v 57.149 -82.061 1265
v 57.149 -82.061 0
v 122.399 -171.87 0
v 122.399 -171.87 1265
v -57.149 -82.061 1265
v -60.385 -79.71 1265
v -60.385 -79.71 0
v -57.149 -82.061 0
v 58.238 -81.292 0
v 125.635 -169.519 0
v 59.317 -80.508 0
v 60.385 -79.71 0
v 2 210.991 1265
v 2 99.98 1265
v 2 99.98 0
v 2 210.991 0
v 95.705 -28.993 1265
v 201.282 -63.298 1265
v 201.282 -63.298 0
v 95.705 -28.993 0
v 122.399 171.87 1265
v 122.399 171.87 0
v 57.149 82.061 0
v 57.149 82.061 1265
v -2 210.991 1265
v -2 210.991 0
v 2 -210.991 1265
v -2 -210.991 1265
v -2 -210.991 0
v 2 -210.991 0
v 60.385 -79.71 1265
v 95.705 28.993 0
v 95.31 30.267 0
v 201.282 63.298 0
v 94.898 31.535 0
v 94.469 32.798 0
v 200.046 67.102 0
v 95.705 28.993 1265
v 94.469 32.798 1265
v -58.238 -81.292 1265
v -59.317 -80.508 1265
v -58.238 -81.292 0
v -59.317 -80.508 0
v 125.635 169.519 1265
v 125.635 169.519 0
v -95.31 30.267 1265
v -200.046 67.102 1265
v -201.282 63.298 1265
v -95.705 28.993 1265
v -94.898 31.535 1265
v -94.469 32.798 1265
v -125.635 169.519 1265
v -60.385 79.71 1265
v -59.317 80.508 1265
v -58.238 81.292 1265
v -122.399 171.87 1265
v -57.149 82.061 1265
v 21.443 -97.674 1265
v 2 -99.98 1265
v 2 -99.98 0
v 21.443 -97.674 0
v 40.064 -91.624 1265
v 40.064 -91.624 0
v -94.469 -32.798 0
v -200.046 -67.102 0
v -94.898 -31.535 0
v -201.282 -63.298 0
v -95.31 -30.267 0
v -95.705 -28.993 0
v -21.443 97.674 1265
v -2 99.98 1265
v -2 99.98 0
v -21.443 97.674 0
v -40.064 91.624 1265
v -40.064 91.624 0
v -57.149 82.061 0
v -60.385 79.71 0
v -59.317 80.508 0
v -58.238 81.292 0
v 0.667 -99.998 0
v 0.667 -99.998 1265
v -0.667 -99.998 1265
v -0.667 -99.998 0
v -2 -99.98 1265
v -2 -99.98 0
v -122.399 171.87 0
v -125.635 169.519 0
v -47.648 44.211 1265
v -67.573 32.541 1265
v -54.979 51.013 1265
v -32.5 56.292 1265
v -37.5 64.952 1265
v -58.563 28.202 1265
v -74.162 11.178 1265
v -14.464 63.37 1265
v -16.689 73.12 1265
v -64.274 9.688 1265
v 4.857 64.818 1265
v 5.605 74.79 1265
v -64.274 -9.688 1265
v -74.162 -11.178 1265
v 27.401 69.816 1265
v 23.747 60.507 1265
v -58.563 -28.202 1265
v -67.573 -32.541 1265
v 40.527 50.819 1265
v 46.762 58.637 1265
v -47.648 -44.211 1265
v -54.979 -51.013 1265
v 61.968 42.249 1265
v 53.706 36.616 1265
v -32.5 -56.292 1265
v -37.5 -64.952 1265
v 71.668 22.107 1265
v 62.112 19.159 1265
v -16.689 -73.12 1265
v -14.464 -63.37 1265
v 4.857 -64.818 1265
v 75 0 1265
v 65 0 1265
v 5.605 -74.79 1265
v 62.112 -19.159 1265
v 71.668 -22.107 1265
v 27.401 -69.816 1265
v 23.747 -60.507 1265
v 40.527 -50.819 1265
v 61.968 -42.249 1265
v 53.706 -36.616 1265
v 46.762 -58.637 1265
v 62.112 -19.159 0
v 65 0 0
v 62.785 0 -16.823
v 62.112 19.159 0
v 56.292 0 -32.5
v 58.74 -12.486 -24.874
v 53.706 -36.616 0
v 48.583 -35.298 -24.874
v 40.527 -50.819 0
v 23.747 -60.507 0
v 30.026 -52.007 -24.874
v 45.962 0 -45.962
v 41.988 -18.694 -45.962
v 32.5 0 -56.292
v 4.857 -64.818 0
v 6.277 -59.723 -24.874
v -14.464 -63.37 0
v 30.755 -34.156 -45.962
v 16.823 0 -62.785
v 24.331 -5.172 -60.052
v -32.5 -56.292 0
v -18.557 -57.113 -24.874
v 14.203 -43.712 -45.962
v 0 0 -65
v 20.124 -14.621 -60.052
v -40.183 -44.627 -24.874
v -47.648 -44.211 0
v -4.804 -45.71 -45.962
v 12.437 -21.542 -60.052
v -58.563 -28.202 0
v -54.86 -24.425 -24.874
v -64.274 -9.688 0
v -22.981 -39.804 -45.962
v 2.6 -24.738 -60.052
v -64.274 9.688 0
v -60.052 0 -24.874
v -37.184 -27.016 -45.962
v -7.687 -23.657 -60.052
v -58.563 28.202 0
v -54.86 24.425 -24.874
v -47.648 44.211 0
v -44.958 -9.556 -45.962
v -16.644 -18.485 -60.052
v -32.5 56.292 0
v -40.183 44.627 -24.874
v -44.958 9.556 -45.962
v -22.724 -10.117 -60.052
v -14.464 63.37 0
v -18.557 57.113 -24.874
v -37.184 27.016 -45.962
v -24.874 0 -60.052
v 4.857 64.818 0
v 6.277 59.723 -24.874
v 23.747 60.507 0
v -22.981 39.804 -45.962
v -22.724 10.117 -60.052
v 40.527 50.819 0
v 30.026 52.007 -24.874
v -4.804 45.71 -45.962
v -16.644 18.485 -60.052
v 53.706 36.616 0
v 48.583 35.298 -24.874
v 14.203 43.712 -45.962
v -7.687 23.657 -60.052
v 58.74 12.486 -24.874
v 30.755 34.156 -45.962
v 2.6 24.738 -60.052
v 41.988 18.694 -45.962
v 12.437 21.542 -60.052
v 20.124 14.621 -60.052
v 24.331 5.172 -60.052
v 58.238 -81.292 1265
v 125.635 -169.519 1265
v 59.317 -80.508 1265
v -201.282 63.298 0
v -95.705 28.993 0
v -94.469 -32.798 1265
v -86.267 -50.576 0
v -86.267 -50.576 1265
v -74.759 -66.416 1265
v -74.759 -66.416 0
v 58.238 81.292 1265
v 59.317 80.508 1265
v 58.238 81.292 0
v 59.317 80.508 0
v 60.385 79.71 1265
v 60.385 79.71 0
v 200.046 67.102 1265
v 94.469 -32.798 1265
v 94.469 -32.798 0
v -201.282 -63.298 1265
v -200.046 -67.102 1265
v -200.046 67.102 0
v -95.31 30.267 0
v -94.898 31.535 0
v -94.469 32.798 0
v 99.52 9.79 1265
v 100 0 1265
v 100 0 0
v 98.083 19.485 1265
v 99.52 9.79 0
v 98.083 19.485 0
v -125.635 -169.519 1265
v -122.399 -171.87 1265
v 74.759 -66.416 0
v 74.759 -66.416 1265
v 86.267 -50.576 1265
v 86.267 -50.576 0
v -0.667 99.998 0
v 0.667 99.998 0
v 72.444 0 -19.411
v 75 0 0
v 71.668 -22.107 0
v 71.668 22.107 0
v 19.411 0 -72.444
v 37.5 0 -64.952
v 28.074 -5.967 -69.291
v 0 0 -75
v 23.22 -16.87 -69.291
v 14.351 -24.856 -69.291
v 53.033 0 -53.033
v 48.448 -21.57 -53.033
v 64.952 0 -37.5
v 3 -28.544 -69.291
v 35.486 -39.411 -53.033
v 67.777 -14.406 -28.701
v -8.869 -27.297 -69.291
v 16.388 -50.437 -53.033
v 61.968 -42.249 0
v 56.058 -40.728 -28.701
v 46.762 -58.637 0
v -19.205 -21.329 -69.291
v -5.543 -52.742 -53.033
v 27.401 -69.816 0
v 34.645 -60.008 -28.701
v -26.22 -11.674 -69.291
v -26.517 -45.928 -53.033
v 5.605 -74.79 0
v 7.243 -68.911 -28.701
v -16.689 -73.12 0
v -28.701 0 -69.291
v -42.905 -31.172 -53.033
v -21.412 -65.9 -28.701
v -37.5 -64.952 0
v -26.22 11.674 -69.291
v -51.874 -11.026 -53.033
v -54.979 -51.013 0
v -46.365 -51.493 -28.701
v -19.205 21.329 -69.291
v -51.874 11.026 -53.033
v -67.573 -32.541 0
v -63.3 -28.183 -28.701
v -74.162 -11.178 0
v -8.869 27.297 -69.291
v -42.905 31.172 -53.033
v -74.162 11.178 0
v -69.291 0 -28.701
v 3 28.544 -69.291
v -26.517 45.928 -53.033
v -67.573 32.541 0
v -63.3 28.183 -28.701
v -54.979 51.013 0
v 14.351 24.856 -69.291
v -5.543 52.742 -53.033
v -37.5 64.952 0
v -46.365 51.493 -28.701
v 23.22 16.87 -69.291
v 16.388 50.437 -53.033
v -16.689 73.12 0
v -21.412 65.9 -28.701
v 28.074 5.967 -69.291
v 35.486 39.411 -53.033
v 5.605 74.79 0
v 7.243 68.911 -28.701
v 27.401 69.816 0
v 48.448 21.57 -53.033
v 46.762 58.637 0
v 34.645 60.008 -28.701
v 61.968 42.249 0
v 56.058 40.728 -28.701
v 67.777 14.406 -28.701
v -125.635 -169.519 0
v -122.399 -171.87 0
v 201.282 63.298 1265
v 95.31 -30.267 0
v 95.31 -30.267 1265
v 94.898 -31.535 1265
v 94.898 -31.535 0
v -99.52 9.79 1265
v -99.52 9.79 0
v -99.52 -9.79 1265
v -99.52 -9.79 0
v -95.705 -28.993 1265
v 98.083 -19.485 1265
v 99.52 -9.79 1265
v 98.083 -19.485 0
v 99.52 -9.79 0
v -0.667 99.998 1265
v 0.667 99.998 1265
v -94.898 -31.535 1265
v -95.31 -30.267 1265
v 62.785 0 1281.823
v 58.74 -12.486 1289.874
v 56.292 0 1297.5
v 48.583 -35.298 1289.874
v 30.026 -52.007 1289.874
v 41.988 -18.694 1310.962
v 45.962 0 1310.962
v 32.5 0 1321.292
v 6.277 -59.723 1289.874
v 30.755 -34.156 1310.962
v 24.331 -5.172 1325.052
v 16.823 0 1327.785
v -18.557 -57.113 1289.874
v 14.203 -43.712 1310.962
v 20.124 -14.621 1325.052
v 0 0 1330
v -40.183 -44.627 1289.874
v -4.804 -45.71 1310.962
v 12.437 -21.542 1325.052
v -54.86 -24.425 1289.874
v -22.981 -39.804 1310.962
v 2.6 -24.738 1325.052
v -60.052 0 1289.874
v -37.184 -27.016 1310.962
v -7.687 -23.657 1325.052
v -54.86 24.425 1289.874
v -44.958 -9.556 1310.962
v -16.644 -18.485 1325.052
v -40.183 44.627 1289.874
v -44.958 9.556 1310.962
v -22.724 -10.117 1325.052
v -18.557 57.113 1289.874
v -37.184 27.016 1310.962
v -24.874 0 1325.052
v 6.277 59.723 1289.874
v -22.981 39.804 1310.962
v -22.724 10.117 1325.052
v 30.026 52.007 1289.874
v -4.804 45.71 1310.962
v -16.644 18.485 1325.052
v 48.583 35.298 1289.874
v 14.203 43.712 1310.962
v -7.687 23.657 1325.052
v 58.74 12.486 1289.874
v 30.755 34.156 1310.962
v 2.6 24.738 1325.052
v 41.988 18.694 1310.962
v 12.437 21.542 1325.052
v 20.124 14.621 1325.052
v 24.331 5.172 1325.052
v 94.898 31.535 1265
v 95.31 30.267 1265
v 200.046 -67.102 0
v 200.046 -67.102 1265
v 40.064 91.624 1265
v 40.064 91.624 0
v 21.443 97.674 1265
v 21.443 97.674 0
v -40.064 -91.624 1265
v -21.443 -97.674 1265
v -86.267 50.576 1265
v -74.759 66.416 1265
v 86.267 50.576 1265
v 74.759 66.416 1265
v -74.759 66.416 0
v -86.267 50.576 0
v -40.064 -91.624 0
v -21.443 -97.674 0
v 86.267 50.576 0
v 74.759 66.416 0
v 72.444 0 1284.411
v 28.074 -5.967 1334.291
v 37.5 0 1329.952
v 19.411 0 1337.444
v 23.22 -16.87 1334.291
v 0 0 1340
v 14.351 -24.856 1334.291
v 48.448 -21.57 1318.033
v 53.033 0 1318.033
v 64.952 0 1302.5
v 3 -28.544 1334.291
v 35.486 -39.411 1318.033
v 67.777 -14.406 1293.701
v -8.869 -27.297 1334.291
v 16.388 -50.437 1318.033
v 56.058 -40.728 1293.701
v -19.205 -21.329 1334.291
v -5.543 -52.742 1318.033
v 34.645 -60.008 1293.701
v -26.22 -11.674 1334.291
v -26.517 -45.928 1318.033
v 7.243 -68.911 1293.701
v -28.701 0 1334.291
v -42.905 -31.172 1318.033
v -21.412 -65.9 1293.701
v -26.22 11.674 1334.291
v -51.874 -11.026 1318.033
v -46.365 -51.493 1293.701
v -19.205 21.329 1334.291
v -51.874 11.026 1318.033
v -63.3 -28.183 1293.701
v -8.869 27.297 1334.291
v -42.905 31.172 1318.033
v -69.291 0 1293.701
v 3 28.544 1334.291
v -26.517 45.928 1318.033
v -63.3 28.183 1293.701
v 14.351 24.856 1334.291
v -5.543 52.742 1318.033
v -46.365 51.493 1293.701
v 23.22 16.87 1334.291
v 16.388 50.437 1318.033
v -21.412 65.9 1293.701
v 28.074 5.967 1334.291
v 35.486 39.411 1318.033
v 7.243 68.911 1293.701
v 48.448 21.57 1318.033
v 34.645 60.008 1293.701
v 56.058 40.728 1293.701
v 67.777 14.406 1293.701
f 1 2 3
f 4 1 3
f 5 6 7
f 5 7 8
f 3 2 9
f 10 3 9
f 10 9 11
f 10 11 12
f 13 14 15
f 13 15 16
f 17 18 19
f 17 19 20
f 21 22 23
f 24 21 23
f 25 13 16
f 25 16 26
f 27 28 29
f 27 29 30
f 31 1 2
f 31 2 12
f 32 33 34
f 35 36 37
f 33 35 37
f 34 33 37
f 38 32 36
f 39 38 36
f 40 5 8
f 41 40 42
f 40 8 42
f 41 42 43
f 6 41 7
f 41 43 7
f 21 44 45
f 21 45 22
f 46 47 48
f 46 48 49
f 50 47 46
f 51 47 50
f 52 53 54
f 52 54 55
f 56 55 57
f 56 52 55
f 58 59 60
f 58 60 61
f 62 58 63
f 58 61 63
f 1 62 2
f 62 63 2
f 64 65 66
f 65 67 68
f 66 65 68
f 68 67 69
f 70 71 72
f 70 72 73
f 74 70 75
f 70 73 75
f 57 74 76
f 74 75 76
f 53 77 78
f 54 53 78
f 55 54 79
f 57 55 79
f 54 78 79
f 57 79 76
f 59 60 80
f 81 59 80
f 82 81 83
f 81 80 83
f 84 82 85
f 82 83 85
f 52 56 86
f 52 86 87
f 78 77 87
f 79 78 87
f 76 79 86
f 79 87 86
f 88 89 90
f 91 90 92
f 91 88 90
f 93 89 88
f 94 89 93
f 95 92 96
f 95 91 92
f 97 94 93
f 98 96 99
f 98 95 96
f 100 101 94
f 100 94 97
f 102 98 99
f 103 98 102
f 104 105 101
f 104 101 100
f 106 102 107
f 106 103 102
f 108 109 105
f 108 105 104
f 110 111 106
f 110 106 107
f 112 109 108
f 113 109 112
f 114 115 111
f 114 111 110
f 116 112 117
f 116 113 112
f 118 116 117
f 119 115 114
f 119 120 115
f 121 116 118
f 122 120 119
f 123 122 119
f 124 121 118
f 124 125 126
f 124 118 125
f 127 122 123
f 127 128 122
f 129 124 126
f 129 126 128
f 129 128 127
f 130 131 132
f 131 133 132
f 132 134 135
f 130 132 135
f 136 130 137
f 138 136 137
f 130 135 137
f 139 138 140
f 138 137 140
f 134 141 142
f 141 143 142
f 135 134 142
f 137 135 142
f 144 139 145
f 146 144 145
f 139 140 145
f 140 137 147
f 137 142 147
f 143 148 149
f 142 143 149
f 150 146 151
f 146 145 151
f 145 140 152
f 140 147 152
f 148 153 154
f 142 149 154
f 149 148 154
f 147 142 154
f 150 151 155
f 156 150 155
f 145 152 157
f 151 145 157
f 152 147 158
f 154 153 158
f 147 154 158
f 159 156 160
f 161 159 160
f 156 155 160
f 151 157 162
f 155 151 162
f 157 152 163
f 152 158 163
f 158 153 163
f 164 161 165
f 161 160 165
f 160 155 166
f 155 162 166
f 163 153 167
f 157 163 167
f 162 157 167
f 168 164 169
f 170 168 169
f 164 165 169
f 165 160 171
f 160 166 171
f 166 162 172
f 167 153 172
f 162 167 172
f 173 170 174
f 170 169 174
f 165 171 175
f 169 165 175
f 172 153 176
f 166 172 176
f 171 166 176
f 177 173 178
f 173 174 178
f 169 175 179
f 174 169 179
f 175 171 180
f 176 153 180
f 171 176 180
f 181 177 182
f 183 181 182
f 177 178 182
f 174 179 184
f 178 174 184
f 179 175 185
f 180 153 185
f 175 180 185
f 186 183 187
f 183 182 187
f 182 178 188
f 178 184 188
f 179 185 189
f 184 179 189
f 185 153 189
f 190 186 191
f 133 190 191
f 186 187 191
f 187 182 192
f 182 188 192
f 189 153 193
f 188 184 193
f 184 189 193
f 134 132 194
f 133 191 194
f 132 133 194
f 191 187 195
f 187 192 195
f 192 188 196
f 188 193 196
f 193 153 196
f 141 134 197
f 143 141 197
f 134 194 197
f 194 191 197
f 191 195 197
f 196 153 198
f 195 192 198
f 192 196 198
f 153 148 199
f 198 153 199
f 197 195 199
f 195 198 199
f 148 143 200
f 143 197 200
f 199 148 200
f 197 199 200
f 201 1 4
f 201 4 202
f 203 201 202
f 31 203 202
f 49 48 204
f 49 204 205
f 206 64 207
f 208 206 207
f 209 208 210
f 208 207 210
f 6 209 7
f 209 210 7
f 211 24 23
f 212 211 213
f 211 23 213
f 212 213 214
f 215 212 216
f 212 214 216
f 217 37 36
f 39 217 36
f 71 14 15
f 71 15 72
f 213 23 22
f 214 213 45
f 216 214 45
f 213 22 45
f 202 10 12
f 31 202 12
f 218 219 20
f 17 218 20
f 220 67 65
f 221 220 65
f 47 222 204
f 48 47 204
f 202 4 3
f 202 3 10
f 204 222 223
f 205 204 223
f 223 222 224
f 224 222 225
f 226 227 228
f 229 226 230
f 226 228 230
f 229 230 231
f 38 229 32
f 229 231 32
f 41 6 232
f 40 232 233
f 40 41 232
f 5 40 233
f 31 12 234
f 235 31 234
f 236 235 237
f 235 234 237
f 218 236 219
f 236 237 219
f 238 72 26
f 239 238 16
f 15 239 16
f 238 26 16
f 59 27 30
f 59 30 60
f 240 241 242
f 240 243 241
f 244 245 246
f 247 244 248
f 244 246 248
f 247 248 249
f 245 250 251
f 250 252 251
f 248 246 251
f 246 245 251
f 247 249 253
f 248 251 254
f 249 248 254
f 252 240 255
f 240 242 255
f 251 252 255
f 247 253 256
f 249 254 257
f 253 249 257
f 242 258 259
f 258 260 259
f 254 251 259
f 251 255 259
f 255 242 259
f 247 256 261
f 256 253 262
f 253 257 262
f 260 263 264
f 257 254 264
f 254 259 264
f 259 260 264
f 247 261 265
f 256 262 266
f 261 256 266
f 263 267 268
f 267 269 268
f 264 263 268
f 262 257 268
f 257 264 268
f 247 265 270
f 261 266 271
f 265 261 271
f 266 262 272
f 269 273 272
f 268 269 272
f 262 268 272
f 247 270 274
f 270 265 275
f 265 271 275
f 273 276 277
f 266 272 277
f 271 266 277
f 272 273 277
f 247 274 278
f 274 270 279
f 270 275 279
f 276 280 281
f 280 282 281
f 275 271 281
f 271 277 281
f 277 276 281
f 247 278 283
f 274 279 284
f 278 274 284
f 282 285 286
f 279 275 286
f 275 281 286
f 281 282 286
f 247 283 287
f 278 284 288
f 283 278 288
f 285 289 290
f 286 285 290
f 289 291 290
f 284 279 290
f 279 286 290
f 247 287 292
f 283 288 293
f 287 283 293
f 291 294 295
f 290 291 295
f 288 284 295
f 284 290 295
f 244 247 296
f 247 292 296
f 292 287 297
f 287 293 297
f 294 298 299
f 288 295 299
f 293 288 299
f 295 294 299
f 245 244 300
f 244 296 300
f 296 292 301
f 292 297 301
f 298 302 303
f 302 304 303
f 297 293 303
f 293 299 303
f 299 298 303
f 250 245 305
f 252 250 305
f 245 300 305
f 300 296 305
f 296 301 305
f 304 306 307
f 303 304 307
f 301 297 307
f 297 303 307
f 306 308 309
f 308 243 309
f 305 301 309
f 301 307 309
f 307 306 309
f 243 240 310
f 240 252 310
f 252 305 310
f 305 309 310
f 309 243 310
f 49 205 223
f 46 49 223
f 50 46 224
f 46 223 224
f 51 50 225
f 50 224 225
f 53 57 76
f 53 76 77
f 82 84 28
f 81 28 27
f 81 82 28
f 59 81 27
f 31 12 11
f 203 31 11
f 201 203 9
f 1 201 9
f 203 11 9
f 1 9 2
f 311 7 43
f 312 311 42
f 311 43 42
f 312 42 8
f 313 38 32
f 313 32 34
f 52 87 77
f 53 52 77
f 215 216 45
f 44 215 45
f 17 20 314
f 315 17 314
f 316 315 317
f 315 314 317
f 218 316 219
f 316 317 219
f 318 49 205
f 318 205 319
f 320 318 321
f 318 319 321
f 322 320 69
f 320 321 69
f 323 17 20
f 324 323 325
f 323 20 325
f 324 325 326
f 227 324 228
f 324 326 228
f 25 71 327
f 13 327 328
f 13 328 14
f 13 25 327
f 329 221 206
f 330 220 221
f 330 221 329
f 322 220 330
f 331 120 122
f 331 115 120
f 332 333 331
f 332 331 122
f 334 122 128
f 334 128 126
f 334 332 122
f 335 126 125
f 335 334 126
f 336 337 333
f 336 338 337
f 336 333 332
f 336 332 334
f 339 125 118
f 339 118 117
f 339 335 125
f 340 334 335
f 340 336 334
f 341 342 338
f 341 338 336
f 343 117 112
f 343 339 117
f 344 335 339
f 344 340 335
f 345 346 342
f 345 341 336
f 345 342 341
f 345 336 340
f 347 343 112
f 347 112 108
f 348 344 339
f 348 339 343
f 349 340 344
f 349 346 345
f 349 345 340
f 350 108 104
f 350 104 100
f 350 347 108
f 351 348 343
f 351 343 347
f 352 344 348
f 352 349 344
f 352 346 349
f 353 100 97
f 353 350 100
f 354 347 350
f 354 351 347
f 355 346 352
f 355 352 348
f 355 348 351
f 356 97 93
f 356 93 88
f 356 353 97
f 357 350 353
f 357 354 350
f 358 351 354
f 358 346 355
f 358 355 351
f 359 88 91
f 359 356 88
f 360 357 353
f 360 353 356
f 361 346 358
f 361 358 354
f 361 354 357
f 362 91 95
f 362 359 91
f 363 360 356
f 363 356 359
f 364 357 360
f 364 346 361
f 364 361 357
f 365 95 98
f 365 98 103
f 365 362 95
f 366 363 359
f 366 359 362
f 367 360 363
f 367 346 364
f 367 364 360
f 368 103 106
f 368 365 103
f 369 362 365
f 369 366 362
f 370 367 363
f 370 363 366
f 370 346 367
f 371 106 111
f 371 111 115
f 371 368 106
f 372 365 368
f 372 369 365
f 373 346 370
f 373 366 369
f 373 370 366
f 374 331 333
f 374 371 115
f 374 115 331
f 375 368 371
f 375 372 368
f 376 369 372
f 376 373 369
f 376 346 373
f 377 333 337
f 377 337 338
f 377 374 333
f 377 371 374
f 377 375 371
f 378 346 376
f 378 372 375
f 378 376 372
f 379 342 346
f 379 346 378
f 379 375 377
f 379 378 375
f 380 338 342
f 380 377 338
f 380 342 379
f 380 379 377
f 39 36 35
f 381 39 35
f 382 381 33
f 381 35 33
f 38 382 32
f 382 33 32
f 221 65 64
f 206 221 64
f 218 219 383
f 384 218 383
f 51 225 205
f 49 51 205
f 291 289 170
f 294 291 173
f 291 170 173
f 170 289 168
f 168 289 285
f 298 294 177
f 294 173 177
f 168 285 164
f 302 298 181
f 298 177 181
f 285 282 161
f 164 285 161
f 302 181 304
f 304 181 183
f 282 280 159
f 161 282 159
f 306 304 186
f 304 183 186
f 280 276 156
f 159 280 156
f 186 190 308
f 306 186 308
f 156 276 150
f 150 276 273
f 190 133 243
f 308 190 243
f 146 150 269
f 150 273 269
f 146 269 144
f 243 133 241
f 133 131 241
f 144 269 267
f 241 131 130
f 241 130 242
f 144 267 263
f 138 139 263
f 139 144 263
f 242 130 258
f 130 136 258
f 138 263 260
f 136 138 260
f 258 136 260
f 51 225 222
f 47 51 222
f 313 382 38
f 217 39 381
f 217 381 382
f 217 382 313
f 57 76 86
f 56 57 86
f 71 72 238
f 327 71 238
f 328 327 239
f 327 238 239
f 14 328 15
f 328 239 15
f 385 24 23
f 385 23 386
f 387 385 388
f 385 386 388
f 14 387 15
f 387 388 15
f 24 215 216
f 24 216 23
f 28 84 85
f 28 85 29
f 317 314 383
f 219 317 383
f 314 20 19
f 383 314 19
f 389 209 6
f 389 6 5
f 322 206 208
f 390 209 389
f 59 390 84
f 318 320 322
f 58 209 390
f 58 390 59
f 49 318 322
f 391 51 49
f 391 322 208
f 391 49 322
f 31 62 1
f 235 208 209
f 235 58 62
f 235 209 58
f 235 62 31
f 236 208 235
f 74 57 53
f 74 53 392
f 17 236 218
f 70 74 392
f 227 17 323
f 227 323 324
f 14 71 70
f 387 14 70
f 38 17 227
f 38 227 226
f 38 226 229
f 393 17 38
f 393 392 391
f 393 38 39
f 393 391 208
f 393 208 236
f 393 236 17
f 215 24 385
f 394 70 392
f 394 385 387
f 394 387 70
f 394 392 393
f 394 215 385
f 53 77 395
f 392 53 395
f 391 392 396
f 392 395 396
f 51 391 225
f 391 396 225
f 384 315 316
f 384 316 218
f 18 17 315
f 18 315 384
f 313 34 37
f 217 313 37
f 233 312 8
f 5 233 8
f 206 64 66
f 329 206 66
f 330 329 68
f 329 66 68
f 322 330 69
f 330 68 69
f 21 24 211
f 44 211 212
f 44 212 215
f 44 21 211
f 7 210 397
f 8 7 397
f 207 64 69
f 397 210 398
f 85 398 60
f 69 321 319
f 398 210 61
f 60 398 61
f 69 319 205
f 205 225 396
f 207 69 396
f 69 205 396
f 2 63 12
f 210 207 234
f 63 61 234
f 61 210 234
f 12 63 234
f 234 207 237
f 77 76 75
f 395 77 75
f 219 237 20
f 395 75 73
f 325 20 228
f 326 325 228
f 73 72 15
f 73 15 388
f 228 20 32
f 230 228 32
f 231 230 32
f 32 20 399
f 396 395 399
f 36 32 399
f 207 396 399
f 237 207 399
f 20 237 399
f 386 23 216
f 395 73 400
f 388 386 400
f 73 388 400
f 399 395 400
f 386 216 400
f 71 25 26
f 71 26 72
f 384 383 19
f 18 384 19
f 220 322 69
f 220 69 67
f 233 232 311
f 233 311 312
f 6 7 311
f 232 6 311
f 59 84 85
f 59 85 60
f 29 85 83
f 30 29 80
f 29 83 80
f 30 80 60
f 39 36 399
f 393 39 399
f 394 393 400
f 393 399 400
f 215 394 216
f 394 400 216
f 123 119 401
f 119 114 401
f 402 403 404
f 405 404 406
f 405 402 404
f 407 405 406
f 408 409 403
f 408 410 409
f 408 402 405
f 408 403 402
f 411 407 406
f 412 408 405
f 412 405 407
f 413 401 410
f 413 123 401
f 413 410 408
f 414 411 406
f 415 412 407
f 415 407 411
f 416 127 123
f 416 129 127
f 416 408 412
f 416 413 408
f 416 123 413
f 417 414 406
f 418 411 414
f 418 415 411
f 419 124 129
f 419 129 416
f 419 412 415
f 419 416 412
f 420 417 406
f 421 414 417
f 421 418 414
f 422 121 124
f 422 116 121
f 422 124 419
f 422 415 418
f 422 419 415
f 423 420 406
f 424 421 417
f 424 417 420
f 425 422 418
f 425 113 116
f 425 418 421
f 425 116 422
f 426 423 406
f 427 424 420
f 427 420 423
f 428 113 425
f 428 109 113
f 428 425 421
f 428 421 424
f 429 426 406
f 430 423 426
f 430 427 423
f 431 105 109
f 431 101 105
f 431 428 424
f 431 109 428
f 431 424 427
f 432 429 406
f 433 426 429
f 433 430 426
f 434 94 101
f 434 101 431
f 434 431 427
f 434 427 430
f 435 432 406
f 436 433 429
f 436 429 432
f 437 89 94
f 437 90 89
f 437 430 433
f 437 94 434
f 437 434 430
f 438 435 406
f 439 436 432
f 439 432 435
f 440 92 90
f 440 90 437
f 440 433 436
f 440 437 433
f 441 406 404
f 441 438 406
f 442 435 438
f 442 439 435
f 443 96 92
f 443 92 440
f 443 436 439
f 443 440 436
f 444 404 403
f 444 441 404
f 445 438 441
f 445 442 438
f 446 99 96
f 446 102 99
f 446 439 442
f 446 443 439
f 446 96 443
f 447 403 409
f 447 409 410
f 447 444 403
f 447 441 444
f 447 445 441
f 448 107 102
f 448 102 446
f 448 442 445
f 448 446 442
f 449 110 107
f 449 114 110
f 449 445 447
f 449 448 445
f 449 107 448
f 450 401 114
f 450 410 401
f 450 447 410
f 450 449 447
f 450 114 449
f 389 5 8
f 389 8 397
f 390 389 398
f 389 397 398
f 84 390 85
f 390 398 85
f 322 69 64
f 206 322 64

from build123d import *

# Parameters (mm, degrees)
BOSS_EXTRUDE1_DEPTH    = 1265
BOSS_EXTRUDE1_2_DEPTH  = 1265
BOSS_EXTRUDE1_3_DEPTH  = 1265
BOSS_EXTRUDE1_4_DEPTH  = 1265
BOSS_EXTRUDE1_5_DEPTH  = 1265
BOSS_EXTRUDE1_6_DEPTH  = 1265
BOSS_EXTRUDE1_7_DEPTH  = 1265
BOSS_EXTRUDE1_8_DEPTH  = 1265
BOSS_EXTRUDE1_9_DEPTH  = 1265
BOSS_EXTRUDE1_10_DEPTH = 1265
BOSS_EXTRUDE1_11_DEPTH = 1265


with BuildPart() as part:
    # Sketch1 → Boss-Extrude1 (new body)
    with BuildSketch(Plane.XY):
        with BuildLine():
            ThreePointArc((-2, 99.979998), (0, 100), (2, 99.979998))
            Line((2, 99.979998), (2, 210.990521114))
            Line((2, 210.990521114), (-2, 210.990521114))
            Line((-2, 210.990521114), (-2, 99.979998))
        make_face()
    extrude(amount=BOSS_EXTRUDE1_DEPTH)


with BuildPart() as body_2:
    # Sketch1 → Boss-Extrude1 2 (new body)
    with BuildSketch(Plane.XY):
        with BuildLine():
            ThreePointArc((-60.384802337, 79.709946975), (-58.778525229, 80.901699437), (-57.14873436, 82.061087984))
            Line((-57.14873436, 82.061087984), (-122.399082696, 171.870487738))
            Line((-122.399082696, 171.870487738), (-125.635150673, 169.519346729))
            Line((-125.635150673, 169.519346729), (-60.384802337, 79.709946975))
        make_face()
    extrude(amount=BOSS_EXTRUDE1_2_DEPTH)


with BuildPart() as body_3:
    # Sketch1 → Boss-Extrude1 3 (new body)
    with BuildSketch(Plane.XY):
        with BuildLine():
            ThreePointArc((-95.704662585, 28.993405447), (-95.10565163, 30.901699437), (-94.468594608, 32.797631512))
            Line((-94.468594608, 32.797631512), (-200.045875993, 67.101769709))
            Line((-200.045875993, 67.101769709), (-201.281943971, 63.297543644))
            Line((-201.281943971, 63.297543644), (-95.704662585, 28.993405447))
        make_face()
    extrude(amount=BOSS_EXTRUDE1_3_DEPTH)


with BuildPart() as body_4:
    # Sketch1 → Boss-Extrude1 4 (new body)
    with BuildSketch(Plane.XY):
        with BuildLine():
            Line((122.399082696, 171.870487738), (57.14873436, 82.061087984))
            ThreePointArc((57.14873436, 82.061087984), (58.778525229, 80.901699437), (60.384802337, 79.709946975))
            Line((60.384802337, 79.709946975), (125.635150673, 169.519346729))
            Line((125.635150673, 169.519346729), (122.399082696, 171.870487738))
        make_face()
    extrude(amount=BOSS_EXTRUDE1_4_DEPTH)


with BuildPart() as body_5:
    # Sketch1 → Boss-Extrude1 5 (new body)
    with BuildSketch(Plane.XY):
        with BuildLine():
            Line((200.045875993, 67.101769709), (94.468594608, 32.797631512))
            ThreePointArc((94.468594608, 32.797631512), (95.10565163, 30.901699437), (95.704662585, 28.993405447))
            Line((95.704662585, 28.993405447), (201.281943971, 63.297543644))
            Line((201.281943971, 63.297543644), (200.045875993, 67.101769709))
        make_face()
    extrude(amount=BOSS_EXTRUDE1_5_DEPTH)


with BuildPart() as body_6:
    # Sketch1 → Boss-Extrude1 6 (new body)
    with BuildSketch(Plane.XY):
        with BuildLine():
            Line((201.281943971, -63.297543644), (95.704662585, -28.993405447))
            ThreePointArc((95.704662585, -28.993405447), (95.10565163, -30.901699437), (94.468594608, -32.797631512))
            Line((94.468594608, -32.797631512), (200.045875993, -67.101769709))
            Line((200.045875993, -67.101769709), (201.281943971, -63.297543644))
        make_face()
    extrude(amount=BOSS_EXTRUDE1_6_DEPTH)


with BuildPart() as body_7:
    # Sketch1 → Boss-Extrude1 7 (new body)
    with BuildSketch(Plane.XY):
        with BuildLine():
            Line((125.635150673, -169.519346729), (60.384802337, -79.709946975))
            ThreePointArc((60.384802337, -79.709946975), (58.778525229, -80.901699437), (57.14873436, -82.061087984))
            Line((57.14873436, -82.061087984), (122.399082696, -171.870487738))
            Line((122.399082696, -171.870487738), (125.635150673, -169.519346729))
        make_face()
    extrude(amount=BOSS_EXTRUDE1_7_DEPTH)


with BuildPart() as body_8:
    # Sketch1 → Boss-Extrude1 8 (new body)
    with BuildSketch(Plane.XY):
        with BuildLine():
            Line((2, -210.990521114), (2, -99.979998))
            ThreePointArc((2, -99.979998), (0, -100), (-2, -99.979998))
            Line((-2, -99.979998), (-2, -210.990521114))
            Line((-2, -210.990521114), (2, -210.990521114))
        make_face()
    extrude(amount=BOSS_EXTRUDE1_8_DEPTH)


with BuildPart() as body_9:
    # Sketch1 → Boss-Extrude1 9 (new body)
    with BuildSketch(Plane.XY):
        with BuildLine():
            ThreePointArc((-57.14873436, -82.061087984), (-58.778525229, -80.901699437), (-60.384802337, -79.709946975))
            Line((-60.384802337, -79.709946975), (-125.635150673, -169.519346729))
            Line((-125.635150673, -169.519346729), (-122.399082696, -171.870487738))
            Line((-122.399082696, -171.870487738), (-57.14873436, -82.061087984))
        make_face()
    extrude(amount=BOSS_EXTRUDE1_9_DEPTH)


with BuildPart() as body_10:
    # Sketch1 → Boss-Extrude1 10 (new body)
    with BuildSketch(Plane.XY):
        with BuildLine():
            ThreePointArc((-94.468594608, -32.797631512), (-95.10565163, -30.901699437), (-95.704662585, -28.993405447))
            Line((-95.704662585, -28.993405447), (-201.281943971, -63.297543644))
            Line((-201.281943971, -63.297543644), (-200.045875993, -67.101769709))
            Line((-200.045875993, -67.101769709), (-94.468594608, -32.797631512))
        make_face()
    extrude(amount=BOSS_EXTRUDE1_10_DEPTH)


with BuildPart() as body_11:
    # Sketch1 → Boss-Extrude1 11 (new body)
    with BuildSketch(Plane.XY):
        with BuildLine():
            Line((60.384802337, 79.709946975), (57.14873436, 82.061087984))
            ThreePointArc((57.14873436, 82.061087984), (30.901699437, 95.10565163), (2, 99.979998))
            Line((2, 99.979998), (-2, 99.979998))
            ThreePointArc((-2, 99.979998), (-30.901699437, 95.10565163), (-57.14873436, 82.061087984))
            Line((-57.14873436, 82.061087984), (-60.384802337, 79.709946975))
            ThreePointArc((-60.384802337, 79.709946975), (-80.901699437, 58.778525229), (-94.468594608, 32.797631512))
            Line((-94.468594608, 32.797631512), (-95.704662585, 28.993405447))
            ThreePointArc((-95.704662585, 28.993405447), (-100, 0), (-95.704662585, -28.993405447))
            Line((-95.704662585, -28.993405447), (-94.468594608, -32.797631512))
            ThreePointArc((-94.468594608, -32.797631512), (-80.901699437, -58.778525229), (-60.384802337, -79.709946975))
            Line((-60.384802337, -79.709946975), (-57.14873436, -82.061087984))
            ThreePointArc((-57.14873436, -82.061087984), (-30.901699437, -95.10565163), (-2, -99.979998))
            Line((-2, -99.979998), (2, -99.979998))
            ThreePointArc((2, -99.979998), (30.901699437, -95.10565163), (57.14873436, -82.061087984))
            Line((57.14873436, -82.061087984), (60.384802337, -79.709946975))
            ThreePointArc((60.384802337, -79.709946975), (80.901699437, -58.778525229), (94.468594608, -32.797631512))
            Line((94.468594608, -32.797631512), (95.704662585, -28.993405447))
            ThreePointArc((95.704662585, -28.993405447), (98.920337289, -14.6549265), (100, 0))
            ThreePointArc((100, 0), (98.920337289, 14.6549265), (95.704662585, 28.993405447))
            Line((95.704662585, 28.993405447), (94.468594608, 32.797631512))
            ThreePointArc((94.468594608, 32.797631512), (80.901699437, 58.778525229), (60.384802337, 79.709946975))
        make_face()
    extrude(amount=BOSS_EXTRUDE1_11_DEPTH)


with BuildPart() as body_12:
    # Sketch2 → Revolve-Thin1 (revolve)
    with BuildSketch(Plane(origin=(0, 0, 0), x_dir=(1, 0, 0), z_dir=(0, 1, 0))):
        with BuildLine():
            ThreePointArc((65, 0), (45.961940777, 45.961940777), (0, 65))
            Line((0, 65), (0, 75))
            ThreePointArc((0, 75), (53.033008589, 53.033008589), (75, 0))
            Line((75, 0), (65, 0))
        make_face()
    revolve(axis=Axis((0, 0, 0), (0, 0, -1)))


with BuildPart() as body_13:
    # Mirror2: mirrored copy
    add(body_12.part.mirror(Plane(origin=(0, 0, 632.5), x_dir=(1, 0, 0), z_dir=(0, 0, -1))))


solid = Compound([part.part, body_2.part, body_3.part, body_4.part, body_5.part, body_6.part, body_7.part, body_8.part, body_9.part, body_10.part, body_11.part, body_12.part, body_13.part])
